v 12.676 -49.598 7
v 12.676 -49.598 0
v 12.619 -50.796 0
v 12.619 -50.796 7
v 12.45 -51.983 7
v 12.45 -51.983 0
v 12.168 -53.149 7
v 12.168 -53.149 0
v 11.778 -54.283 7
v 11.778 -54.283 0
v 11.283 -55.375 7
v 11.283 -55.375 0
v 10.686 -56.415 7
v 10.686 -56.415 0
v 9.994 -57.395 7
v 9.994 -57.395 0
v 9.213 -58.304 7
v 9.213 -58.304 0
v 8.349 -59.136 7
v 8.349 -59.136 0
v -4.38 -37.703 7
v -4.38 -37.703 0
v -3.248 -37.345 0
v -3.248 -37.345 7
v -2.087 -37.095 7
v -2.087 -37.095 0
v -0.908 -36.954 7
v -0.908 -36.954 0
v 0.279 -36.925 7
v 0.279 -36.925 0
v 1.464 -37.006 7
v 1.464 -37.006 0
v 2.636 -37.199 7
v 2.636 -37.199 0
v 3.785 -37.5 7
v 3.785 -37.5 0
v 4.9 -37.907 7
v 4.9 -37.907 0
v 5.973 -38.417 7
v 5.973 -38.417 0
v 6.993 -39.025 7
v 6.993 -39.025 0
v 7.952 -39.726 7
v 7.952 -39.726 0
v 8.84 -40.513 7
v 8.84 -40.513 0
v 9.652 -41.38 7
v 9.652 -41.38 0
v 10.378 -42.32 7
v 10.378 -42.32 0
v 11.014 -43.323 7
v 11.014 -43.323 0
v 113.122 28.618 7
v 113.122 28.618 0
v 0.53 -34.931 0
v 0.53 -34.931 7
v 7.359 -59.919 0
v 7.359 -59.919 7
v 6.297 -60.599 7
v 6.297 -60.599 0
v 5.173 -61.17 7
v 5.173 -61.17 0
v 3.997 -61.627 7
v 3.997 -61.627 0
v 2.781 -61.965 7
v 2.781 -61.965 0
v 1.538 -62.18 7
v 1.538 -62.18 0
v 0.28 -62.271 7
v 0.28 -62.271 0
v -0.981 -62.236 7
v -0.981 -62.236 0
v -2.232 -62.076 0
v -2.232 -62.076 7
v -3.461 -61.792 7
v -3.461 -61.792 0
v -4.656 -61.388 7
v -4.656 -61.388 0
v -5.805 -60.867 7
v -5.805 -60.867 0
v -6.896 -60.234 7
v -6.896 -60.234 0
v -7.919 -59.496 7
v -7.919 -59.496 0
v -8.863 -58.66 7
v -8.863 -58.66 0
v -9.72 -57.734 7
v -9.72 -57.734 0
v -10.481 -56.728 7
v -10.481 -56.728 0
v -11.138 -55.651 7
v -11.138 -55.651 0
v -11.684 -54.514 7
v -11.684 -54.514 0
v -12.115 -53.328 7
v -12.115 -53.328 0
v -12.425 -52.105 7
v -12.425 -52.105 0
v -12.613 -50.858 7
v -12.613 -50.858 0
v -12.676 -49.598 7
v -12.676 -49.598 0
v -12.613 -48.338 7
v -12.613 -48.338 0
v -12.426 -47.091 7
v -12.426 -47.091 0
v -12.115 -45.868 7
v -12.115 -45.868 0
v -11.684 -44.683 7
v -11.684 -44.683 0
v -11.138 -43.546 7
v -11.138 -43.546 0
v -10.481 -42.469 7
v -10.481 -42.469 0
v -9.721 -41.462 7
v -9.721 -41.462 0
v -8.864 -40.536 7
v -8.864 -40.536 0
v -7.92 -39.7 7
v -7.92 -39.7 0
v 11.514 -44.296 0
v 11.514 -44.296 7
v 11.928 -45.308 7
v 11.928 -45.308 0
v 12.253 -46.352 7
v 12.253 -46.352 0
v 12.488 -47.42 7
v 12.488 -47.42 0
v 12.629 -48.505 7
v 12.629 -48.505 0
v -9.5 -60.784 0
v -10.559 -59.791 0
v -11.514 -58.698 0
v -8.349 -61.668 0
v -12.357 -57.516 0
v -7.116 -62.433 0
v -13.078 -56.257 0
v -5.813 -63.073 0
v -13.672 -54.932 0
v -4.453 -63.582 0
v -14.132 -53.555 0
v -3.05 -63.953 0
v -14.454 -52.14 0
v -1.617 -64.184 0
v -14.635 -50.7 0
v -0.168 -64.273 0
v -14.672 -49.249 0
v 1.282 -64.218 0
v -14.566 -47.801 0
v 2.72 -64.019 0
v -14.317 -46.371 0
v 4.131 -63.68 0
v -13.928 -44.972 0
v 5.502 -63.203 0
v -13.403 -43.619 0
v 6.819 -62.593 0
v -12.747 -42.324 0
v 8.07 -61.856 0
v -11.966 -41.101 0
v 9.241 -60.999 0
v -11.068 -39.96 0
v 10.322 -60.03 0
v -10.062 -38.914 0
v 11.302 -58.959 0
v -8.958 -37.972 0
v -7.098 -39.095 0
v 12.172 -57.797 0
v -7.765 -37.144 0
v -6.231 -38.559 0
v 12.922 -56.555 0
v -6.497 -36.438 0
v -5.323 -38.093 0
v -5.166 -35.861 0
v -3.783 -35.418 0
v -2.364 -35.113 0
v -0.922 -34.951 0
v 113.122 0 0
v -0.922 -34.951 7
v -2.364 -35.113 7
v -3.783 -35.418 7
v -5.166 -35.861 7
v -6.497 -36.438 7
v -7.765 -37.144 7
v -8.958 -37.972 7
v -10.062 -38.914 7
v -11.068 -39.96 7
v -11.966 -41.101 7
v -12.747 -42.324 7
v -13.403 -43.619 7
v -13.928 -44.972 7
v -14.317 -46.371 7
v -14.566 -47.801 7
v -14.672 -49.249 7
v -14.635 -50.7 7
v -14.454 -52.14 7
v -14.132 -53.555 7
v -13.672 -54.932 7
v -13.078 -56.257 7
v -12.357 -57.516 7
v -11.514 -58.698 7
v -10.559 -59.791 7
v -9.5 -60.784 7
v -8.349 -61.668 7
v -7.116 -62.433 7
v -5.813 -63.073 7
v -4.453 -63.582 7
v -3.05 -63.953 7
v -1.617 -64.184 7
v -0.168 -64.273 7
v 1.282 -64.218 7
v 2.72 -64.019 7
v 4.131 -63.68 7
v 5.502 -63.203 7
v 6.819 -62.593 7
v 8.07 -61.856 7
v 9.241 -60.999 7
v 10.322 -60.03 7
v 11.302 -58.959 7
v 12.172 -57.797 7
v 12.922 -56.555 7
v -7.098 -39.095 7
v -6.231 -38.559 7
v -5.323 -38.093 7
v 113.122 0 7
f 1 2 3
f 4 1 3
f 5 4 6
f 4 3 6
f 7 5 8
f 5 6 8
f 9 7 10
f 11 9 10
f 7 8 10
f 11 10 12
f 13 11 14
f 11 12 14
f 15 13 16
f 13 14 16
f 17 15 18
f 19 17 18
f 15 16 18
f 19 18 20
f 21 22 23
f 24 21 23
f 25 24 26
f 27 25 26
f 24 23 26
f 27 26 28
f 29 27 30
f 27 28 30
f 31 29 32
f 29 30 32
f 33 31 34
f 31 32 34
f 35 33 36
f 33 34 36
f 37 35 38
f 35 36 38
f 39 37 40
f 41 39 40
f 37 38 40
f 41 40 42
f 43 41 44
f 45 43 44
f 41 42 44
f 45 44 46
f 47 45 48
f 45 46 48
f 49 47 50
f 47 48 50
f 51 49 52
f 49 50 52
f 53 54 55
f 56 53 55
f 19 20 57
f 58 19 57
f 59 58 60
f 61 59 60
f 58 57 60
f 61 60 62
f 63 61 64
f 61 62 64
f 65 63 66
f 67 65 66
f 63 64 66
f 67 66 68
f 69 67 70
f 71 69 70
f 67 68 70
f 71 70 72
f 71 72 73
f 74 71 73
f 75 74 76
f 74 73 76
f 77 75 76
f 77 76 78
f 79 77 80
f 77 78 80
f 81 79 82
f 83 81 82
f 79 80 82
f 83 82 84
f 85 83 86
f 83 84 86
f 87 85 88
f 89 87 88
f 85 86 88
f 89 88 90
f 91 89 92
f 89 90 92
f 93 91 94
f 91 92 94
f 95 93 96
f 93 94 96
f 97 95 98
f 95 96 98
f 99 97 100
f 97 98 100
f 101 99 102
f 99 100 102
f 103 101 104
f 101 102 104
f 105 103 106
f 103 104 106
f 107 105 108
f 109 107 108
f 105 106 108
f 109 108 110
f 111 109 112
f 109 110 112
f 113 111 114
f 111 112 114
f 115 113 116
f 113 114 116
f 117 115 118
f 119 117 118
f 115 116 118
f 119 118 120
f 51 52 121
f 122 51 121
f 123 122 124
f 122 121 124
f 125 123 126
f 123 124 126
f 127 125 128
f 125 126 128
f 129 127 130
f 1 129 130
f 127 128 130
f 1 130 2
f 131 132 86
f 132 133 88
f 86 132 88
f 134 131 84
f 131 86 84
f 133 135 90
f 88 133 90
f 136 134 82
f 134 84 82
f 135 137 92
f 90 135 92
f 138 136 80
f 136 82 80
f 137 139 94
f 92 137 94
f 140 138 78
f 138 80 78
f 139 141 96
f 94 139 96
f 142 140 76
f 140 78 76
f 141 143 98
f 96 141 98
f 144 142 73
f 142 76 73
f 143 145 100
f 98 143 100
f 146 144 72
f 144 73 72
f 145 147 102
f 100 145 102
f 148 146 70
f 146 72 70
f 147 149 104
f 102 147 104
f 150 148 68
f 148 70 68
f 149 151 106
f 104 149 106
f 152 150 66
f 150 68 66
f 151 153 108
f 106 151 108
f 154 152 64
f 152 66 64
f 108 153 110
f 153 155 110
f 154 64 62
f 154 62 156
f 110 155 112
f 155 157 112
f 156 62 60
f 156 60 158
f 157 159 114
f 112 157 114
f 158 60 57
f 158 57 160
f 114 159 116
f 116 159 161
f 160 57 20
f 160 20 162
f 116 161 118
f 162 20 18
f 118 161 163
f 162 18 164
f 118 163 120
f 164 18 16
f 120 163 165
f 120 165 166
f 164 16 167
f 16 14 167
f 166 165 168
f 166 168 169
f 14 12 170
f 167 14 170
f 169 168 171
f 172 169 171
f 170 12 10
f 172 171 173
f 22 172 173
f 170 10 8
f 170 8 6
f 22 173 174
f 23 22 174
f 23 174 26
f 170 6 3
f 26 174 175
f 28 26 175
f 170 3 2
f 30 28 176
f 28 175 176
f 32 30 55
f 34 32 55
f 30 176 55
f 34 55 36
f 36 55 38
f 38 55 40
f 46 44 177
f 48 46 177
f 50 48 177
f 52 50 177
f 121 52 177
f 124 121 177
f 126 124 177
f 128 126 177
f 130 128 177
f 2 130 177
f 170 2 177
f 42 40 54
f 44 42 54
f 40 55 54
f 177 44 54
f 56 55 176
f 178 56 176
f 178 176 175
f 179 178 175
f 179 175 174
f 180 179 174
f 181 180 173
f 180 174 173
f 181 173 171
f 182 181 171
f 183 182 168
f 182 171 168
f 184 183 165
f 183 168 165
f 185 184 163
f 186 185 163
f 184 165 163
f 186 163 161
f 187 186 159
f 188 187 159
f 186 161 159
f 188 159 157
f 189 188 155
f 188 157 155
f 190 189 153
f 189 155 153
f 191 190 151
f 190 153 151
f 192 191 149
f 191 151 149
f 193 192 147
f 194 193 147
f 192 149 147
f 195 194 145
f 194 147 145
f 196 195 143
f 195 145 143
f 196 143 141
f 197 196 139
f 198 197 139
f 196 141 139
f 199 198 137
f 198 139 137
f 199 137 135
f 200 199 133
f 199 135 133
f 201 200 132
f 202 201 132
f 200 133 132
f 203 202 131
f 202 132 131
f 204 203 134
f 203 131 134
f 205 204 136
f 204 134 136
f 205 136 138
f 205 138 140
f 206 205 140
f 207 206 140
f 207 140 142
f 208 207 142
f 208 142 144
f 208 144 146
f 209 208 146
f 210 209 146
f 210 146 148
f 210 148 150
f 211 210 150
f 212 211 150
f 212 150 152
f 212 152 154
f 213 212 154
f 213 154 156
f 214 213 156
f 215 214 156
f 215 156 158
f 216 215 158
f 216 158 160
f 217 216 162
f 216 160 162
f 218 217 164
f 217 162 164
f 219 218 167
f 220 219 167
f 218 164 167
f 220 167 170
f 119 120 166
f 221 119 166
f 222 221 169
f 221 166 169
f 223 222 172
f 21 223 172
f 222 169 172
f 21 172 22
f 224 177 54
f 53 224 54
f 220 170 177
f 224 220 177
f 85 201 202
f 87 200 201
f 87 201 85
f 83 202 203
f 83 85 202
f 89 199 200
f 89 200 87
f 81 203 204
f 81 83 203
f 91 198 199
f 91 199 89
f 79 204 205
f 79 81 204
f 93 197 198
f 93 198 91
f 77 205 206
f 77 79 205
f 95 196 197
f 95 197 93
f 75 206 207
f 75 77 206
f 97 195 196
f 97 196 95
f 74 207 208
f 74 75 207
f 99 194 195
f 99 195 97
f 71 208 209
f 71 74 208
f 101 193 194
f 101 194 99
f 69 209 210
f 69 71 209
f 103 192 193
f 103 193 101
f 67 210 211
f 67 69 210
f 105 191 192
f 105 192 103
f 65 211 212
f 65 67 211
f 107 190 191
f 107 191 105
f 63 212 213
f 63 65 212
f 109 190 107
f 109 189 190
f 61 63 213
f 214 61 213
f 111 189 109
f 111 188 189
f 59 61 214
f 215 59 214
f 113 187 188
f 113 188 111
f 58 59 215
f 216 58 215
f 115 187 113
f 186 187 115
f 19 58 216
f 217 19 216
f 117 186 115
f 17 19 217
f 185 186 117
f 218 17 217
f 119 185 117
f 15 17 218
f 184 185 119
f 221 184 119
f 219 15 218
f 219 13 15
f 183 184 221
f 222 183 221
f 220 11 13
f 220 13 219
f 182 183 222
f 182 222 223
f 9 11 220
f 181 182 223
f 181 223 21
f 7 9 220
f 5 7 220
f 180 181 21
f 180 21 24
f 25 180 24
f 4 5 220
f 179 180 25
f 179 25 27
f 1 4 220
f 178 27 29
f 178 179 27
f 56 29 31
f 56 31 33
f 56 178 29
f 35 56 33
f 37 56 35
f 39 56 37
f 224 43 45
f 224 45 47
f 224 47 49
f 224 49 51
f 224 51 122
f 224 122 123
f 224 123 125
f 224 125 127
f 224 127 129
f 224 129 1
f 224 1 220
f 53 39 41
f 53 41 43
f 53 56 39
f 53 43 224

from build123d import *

# Parameters (mm, degrees)
F1_DEPTH = 7


with BuildPart() as f1:
    # F0 (on Top) → F1 (new body)
    with BuildSketch(Plane.XY):
        with BuildLine():
            ThreePointArc((11.013950333, -43.3227563745), (12.2534652904, -46.3520190309), (12.6760278509, -49.5976731181))
            ThreePointArc((12.6760278509, -49.5976731181), (11.5436081746, -54.8347326353), (8.3486797715, -59.1360811692))
            Line((8.3486797715, -59.1360811692), (12.9223209509, -56.5546419063))
            ThreePointArc((12.9223209509, -56.5546419063), (14.2308491604, -53.1849737262), (14.6760278509, -49.5976731181))
            ThreePointArc((14.6760278509, -49.5976731181), (14.1878219864, -45.8438083413), (12.7556852478, -42.3396921772))
            Line((12.7556852478, -42.3396921772), (11.013950333, -43.3227563745))
        make_face()
        with BuildLine():
            ThreePointArc((-4.3802724447, -37.7025104296), (4.3472073452, -37.6903866777), (11.013950333, -43.3227563745))
            Line((11.013950333, -43.3227563745), (12.7556852478, -42.3396921772))
            ThreePointArc((12.7556852478, -42.3396921772), (7.6057300665, -37.0462324185), (0.5297543163, -34.9312095415))
            Line((0.5297543163, -34.9312095415), (-4.3802724447, -37.7025104296))
        make_face()
        with BuildLine():
            Line((12.9223209509, -56.5546419063), (8.3486797715, -59.1360811692))
            ThreePointArc((8.3486797715, -59.1360811692), (-9.7202647257, -57.7338967961), (-7.9198073974, -39.7002829134))
            ThreePointArc((-7.9198073974, -39.7002829134), (-6.2306311682, -38.5586098734), (-4.3802724447, -37.7025104296))
            Line((-4.3802724447, -37.7025104296), (0.5297543163, -34.9312095415))
            ThreePointArc((0.5297543163, -34.9312095415), (-12.7331374397, -56.8951387344), (12.9223209509, -56.5546419063))
        make_face()
        with BuildLine():
            ThreePointArc((0.5297543163, -34.9312095415), (7.6057300665, -37.0462324185), (12.7556852478, -42.3396921772))
            Line((12.7556852478, -42.3396921772), (113.1224855781, 14.3090016955))
            Line((113.1224855781, 14.3090016955), (113.1224855781, 28.618003391))
            Line((113.1224855781, 28.618003391), (0.5297543163, -34.9312095415))
        make_face()
        with BuildLine():
            Line((113.1224855781, 14.3090016955), (12.7556852478, -42.3396921772))
            ThreePointArc((12.7556852478, -42.3396921772), (14.1878219864, -45.8438083413), (14.6760278509, -49.5976731181))
            ThreePointArc((14.6760278509, -49.5976731181), (14.2308491604, -53.1849737262), (12.9223209509, -56.5546419063))
            Line((12.9223209509, -56.5546419063), (113.1224855781, 0))
            Line((113.1224855781, 0), (113.1224855781, 14.3090016955))
        make_face()
    extrude(amount=F1_DEPTH)


solid = f1.part
